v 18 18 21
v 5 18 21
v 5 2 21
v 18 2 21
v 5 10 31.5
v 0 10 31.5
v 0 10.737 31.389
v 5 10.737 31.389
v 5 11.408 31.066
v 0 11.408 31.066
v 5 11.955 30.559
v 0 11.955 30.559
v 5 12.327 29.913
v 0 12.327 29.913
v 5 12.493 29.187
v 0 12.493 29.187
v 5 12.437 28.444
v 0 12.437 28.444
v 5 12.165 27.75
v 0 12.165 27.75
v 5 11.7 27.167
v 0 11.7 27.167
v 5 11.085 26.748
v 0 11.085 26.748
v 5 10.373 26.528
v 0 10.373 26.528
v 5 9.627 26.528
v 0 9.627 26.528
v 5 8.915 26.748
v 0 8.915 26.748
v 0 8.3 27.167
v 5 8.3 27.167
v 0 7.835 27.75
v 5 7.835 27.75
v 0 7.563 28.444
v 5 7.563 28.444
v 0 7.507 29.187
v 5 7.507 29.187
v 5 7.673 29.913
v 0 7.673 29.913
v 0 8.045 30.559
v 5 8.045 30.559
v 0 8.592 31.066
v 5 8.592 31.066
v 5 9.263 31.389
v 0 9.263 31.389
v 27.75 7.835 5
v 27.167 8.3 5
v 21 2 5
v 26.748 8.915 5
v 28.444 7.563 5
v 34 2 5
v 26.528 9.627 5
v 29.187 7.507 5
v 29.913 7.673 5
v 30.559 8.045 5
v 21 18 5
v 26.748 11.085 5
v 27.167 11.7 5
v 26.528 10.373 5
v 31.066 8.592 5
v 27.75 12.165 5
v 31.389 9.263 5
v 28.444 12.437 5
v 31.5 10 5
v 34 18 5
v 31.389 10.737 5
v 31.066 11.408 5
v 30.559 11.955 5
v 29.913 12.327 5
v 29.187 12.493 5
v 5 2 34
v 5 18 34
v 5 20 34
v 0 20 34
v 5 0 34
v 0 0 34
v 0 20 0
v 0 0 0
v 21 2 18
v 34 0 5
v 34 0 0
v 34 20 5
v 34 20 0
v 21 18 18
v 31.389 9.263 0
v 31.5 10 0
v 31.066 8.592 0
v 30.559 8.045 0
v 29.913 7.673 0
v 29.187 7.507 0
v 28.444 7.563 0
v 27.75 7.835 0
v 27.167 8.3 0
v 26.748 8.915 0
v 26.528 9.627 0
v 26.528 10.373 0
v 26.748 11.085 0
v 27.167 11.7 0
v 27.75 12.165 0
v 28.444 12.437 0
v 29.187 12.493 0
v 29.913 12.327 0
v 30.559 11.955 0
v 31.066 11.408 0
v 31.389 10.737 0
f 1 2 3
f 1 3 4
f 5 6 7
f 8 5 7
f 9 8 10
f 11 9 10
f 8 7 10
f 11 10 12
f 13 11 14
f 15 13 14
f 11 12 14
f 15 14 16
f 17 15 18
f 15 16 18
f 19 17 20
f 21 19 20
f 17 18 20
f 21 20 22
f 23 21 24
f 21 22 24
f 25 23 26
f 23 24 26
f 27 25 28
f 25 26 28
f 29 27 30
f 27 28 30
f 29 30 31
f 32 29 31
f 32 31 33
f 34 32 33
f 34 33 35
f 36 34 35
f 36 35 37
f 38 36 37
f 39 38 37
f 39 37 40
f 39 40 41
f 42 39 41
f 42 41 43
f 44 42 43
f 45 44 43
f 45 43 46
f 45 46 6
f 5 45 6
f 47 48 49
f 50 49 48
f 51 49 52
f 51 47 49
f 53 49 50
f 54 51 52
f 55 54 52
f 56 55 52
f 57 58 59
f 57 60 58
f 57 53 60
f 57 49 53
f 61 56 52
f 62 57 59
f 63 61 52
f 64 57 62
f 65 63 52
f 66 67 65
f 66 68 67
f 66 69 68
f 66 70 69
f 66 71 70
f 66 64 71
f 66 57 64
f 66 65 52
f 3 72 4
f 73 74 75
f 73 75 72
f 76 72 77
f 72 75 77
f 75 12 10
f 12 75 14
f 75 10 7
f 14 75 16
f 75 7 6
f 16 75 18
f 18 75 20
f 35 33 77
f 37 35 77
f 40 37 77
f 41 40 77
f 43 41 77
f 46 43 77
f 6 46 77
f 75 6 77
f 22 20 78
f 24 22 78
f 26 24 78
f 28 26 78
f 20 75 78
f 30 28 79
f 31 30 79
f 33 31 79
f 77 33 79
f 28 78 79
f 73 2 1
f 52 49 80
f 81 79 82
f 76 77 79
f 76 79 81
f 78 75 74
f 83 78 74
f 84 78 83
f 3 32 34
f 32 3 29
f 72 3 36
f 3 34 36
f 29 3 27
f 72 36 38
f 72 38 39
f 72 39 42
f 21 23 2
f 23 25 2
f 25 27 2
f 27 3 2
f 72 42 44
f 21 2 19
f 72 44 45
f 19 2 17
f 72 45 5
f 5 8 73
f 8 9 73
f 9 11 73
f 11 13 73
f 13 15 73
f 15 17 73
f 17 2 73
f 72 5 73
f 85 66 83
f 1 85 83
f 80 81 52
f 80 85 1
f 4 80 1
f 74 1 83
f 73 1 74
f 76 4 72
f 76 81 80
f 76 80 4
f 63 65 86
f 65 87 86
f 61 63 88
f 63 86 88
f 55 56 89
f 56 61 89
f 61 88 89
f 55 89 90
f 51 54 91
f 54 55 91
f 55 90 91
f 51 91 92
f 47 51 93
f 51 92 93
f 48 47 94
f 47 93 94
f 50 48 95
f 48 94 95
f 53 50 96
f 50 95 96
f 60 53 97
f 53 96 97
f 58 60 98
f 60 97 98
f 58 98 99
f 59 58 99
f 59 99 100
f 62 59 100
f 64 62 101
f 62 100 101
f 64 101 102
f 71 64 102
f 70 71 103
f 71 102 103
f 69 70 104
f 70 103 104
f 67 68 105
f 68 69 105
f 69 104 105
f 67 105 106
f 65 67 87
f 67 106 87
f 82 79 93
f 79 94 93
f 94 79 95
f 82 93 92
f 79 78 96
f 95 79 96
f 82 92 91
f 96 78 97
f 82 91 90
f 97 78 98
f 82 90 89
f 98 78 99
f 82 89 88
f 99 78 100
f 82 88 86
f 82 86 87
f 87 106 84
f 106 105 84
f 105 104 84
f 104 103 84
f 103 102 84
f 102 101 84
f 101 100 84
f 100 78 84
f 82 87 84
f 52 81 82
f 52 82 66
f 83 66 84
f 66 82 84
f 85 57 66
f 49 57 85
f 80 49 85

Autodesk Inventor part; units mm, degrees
ref_plane "YZ Plane" through (0, 0, 0) normal (1, 0, 0) x (0, 1, 0)
ref_plane "XZ Plane" through (0, 0, 0) normal (0, 1, 0) x (-1, 0, 0)
ref_plane "XY Plane" through (0, 0, 0) normal (0, 0, 1) x (1, 0, 0)
sketch "Sketch1" plane through (0, 0, 0) normal (0, 0, 1) x (1, 0, 0)
  line L0 (0, 0) -> (34, 0)
  line L1 (34, 0) -> (34, 20)
  line L2 (34, 20) -> (0, 20)
  line L3 (0, 20) -> (0, 0)
  circle A0 centre (29, 10) radius 2.5
  point P0 (34, 10)
  dimension "d0" = 34
  dimension "d1" = 20
  dimension "d2" = 5
  dimension "d3" = 5
extrude "Extrusion1" add sketch "Sketch1" along normal blind 5
sketch "Sketch2" plane through (0, 0, 0) normal (-1, 0, 0) x (0, 0, 1)
  line L0 (0, 0) -> (0, 20) projected
  line L1 (0, 20) -> (34, 20)
  line L2 (34, 20) -> (34, 0)
  line L3 (34, 0) -> (0, 0)
  line L4 (0, 0) -> (0, 20)
  circle A0 centre (29, 10) radius 2.5
  point P0 (5, 0)
  point P1 (34, 10)
  dimension "d6" = 34
  dimension "d7" = 5
  dimension "d8" = 5
extrude "Extrusion2" add sketch "Sketch2" against normal blind 5
sketch "Sketch3" plane through (0, 20, 0) normal (0, 1, 0) x (1, 0, 0)
  line L0 (34, -5) -> (5, -5) projected
  line L1 (5, -5) -> (5, -34) projected
  line L2 (5, -34) -> (5, -5) projected
  line L3 (5, -34) -> (34, -5)
  point P0 (0, 0)
extrude "Extrusion3" add sketch "Sketch3" against normal blind 2
sketch "Sketch4" plane through (0, 0, 0) normal (0, -1, 0) x (1, 0, 0)
  line L0 (34, 5) -> (5, 5) projected
  line L1 (34, 5) -> (5, 34) projected
  line L2 (5, 5) -> (5, 34) projected
  point P0 (0, 0)
extrude "Extrusion4" add sketch "Sketch4" against normal blind 2
sketch "Sketch5" plane through (0, 18, 0) normal (0, -1, 0) x (1, 0, 0)
  line L0 (5, 31.5) -> (5, 26.5) projected
  line L1 (26.5, 5) -> (31.5, 5) projected
  line L2 (5, 26.5) -> (5, 5)
  line L3 (5, 5) -> (26.5, 5)
  line L4 (5, 21) -> (21, 5)
  line L5 (29, 5) -> (29, 0)
  line L6 (34, 0) -> (0, 0) projected
  line L7 (5, 29) -> (0, 29)
  line L8 (5, 21) -> (18, 21)
  line L9 (21, 5) -> (21, 18)
  line L10 (5, 34) -> (34, 5) projected
  line L11 (18, 21) -> (21, 18)
  dimension "d15" = 8
  dimension "d16" = 8
extrude "Extrusion5" add sketch "Sketch5" along normal blind 16
properties part number "L Bracket Small"
